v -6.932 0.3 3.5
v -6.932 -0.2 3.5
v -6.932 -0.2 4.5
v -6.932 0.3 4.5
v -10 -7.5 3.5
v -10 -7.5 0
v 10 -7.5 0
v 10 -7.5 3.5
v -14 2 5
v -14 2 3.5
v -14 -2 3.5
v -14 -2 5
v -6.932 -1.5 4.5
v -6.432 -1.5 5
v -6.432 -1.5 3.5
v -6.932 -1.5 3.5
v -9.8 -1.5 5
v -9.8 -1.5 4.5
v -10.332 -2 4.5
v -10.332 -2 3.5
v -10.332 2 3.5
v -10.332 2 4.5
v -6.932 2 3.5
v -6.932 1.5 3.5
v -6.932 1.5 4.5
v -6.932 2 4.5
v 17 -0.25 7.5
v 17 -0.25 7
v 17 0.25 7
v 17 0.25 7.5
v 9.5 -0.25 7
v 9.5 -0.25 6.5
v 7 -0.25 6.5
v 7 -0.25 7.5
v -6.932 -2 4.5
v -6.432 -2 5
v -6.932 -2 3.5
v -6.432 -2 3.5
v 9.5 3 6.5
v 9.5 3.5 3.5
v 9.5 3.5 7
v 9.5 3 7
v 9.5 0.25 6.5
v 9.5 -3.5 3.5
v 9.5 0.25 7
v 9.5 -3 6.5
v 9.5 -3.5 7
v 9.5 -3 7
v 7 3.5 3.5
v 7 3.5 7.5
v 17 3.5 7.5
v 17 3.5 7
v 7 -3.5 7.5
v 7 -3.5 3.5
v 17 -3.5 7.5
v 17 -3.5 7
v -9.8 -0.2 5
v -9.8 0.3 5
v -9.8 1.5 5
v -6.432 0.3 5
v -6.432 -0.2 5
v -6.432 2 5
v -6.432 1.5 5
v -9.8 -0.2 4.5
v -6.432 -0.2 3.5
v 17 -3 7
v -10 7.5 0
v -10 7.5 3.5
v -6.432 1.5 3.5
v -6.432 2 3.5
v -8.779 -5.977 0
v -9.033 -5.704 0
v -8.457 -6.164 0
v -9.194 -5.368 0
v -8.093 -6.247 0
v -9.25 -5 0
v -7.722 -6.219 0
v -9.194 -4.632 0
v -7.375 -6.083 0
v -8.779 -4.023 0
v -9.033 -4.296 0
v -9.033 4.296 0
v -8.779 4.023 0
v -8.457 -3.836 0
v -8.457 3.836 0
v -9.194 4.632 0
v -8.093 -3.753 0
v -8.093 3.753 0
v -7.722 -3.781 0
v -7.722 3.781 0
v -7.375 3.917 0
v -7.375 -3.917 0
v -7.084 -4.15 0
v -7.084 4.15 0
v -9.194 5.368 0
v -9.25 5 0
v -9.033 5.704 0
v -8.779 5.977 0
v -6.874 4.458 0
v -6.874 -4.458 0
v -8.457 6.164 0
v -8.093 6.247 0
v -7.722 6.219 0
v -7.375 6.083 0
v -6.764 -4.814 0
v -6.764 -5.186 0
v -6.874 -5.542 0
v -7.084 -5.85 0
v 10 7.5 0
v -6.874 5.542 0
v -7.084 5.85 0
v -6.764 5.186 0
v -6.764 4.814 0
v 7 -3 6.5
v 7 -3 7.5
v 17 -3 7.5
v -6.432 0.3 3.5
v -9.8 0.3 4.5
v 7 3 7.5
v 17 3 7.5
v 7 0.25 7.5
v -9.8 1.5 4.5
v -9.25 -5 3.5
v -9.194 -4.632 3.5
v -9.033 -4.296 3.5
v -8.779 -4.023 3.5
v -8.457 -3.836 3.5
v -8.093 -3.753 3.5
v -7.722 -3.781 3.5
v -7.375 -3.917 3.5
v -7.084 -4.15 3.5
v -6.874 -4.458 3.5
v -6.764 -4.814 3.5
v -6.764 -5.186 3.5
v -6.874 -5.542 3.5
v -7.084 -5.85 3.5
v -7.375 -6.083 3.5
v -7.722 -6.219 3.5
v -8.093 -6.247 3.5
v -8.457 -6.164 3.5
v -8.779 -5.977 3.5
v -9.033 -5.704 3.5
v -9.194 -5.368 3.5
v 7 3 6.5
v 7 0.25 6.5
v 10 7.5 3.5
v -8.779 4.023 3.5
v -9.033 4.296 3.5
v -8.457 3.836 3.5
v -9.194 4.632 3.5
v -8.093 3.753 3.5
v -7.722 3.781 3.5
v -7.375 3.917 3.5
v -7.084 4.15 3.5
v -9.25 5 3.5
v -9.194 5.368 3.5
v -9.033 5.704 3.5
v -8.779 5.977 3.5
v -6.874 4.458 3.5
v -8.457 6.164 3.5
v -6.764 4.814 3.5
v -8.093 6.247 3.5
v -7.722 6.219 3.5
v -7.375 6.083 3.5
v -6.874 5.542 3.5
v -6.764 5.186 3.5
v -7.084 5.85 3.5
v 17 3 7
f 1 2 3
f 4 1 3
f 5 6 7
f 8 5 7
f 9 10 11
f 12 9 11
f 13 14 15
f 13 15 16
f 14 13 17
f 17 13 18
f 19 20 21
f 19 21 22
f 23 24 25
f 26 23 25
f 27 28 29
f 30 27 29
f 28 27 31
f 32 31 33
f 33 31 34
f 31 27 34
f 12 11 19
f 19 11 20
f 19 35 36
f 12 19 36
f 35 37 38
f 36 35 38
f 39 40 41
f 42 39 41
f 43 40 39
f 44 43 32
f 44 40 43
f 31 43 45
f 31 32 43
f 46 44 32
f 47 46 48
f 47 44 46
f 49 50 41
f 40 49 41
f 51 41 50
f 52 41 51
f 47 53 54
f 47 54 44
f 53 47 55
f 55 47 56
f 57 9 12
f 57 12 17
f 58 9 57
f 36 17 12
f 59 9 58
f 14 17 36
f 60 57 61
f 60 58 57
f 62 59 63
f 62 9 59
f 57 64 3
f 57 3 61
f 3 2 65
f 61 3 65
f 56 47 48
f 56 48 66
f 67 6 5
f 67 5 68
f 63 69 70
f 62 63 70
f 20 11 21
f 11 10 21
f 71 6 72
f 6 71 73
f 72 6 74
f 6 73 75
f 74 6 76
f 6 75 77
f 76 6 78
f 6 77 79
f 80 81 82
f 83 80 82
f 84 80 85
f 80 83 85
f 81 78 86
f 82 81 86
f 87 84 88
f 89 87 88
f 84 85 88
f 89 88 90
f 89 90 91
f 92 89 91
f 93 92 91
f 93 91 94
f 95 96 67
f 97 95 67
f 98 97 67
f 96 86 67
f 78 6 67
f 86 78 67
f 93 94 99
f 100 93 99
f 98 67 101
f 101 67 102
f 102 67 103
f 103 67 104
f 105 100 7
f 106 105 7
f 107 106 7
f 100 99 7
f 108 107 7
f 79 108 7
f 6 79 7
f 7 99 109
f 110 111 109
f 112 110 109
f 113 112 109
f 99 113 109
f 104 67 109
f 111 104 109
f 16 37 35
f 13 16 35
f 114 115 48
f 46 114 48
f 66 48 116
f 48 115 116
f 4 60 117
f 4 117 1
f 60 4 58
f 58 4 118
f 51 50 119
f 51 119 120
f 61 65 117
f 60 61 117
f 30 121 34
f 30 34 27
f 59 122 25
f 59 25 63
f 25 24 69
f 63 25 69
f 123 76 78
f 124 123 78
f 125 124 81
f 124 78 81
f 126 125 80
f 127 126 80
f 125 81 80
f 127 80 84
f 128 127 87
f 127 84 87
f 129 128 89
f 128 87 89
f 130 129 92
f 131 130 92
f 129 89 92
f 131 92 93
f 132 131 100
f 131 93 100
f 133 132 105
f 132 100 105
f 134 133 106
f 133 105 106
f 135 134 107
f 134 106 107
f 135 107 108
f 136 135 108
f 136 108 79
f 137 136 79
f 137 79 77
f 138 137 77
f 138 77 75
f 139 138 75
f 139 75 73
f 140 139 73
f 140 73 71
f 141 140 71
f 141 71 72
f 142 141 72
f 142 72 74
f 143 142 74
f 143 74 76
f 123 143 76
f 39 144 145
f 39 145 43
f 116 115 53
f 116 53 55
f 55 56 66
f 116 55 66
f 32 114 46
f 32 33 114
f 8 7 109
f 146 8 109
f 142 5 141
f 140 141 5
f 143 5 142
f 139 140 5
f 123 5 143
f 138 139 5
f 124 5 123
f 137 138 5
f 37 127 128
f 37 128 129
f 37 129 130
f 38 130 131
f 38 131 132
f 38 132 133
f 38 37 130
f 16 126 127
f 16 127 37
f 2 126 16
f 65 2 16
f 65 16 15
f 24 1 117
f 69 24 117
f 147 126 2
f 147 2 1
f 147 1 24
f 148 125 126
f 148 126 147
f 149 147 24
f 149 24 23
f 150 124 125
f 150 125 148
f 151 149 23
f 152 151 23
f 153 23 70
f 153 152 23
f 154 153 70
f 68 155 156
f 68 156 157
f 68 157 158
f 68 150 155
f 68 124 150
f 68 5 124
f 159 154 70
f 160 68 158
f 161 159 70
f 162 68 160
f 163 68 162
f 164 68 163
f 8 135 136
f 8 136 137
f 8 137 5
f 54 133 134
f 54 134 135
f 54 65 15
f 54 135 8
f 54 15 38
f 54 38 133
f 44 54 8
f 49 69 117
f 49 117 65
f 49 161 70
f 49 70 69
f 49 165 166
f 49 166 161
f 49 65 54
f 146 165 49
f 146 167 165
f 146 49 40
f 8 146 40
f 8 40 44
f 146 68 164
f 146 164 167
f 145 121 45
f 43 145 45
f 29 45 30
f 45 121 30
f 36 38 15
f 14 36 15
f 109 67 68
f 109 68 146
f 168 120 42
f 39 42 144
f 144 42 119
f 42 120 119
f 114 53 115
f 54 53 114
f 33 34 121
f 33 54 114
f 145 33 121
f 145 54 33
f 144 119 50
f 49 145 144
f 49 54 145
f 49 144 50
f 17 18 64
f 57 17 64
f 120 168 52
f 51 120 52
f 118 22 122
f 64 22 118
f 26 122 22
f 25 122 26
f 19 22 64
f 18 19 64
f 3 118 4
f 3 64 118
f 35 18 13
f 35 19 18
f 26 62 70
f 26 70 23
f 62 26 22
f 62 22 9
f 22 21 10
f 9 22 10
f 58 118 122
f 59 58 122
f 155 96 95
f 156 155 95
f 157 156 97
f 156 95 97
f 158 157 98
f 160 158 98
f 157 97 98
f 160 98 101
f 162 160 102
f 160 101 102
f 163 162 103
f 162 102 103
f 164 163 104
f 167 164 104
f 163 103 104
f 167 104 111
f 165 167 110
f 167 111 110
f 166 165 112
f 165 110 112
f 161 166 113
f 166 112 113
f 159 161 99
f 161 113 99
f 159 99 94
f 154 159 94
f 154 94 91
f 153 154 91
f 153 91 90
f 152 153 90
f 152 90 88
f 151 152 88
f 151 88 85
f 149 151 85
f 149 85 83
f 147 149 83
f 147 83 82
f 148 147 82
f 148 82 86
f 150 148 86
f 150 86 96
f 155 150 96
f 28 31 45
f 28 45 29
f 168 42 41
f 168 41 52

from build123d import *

# Parameters (mm, degrees)
SKETCH1_W           = 20
SKETCH1_H           = 15
BOSS_EXTRUDE1_DEPTH = 3.5
BOSS_EXTRUDE8_DEPTH = 1.5
SKETCH3_W           = 3.4
SKETCH3_H           = 1
CUT_EXTRUDE1_DEPTH  = 18.642278764
SKETCH4_W           = 10
SKETCH4_H           = 7
BOSS_EXTRUDE9_DEPTH = 4
SKETCH5_W           = 7.5
SKETCH5_H           = 3.5
CUT_EXTRUDE2_DEPTH  = 22.592822882
CUT_EXTRUDE3_DEPTH  = 1
SKETCH7_R           = 1.25
CUT_EXTRUDE4_DEPTH  = 21.03746491


with BuildPart() as part:
    # Sketch1 → Boss-Extrude1 (new body)
    with BuildSketch(Plane.XY):
        Rectangle(SKETCH1_W, SKETCH1_H)
    extrude(amount=BOSS_EXTRUDE1_DEPTH)

    # Sketch2 → Boss-Extrude8 (add)
    with BuildSketch(Plane.XY.offset(3.5)):
        Polygon((-6.431580724, 2), (-10, 2), (-10, 1.5), (-10, 0.3), (-10, -2), (-6.431580724, -2), (-6.431580724, -1.5), (-9.8, -1.5), (-9.8, -0.2), (-6.431580724, -0.2), (-6.431580724, 0.3), (-9.8, 0.3), (-9.8, 1.5), (-6.431580724, 1.5), align=None)
        Polygon((-10, 1.5), (-10, 2), (-14, 2), (-14, -2), (-10, -2), (-10, 0.3), align=None)
    extrude(amount=BOSS_EXTRUDE8_DEPTH)

    # Sketch3 → Cut-Extrude1 (cut, through all)
    with BuildSketch(Plane.XZ.offset(2)):
        with Locations((-8.631580724, 4)):
            Rectangle(SKETCH3_W, SKETCH3_H)
    extrude(amount=-CUT_EXTRUDE1_DEPTH, mode=Mode.SUBTRACT)

    # Sketch4 → Boss-Extrude9 (add)
    with BuildSketch(Plane.XY.offset(3.5)):
        with Locations((12, 0)):
            Rectangle(SKETCH4_W, SKETCH4_H)
    extrude(amount=BOSS_EXTRUDE9_DEPTH)

    # Sketch5 → Cut-Extrude2 (cut, through all)
    with BuildSketch(Plane.XZ.offset(3.5)):
        with Locations((13.25, 5.25)):
            Rectangle(SKETCH5_W, SKETCH5_H)
    extrude(amount=-CUT_EXTRUDE2_DEPTH, mode=Mode.SUBTRACT)

    # Sketch6 → Cut-Extrude3 (cut)
    with BuildSketch(Plane.XY.offset(7.5)):
        Polygon((17, 3), (6, 3), (6, 0.25), (17, 0.25), (17, -0.25), (6, -0.25), (6, -3), (17, -3), (18, -3), (18, 3), align=None)
    extrude(amount=-CUT_EXTRUDE3_DEPTH, mode=Mode.SUBTRACT)

    # Sketch7 → Cut-Extrude4 (cut, through all)
    with BuildSketch(Plane(origin=(0, 0, 0), x_dir=(-1, 0, 0), z_dir=(0, 0, -1))):
        with Locations((8, -5)):
            Circle(SKETCH7_R)
        with Locations((8, 5)):
            Circle(SKETCH7_R)
    extrude(amount=-CUT_EXTRUDE4_DEPTH, mode=Mode.SUBTRACT)


solid = part.part
